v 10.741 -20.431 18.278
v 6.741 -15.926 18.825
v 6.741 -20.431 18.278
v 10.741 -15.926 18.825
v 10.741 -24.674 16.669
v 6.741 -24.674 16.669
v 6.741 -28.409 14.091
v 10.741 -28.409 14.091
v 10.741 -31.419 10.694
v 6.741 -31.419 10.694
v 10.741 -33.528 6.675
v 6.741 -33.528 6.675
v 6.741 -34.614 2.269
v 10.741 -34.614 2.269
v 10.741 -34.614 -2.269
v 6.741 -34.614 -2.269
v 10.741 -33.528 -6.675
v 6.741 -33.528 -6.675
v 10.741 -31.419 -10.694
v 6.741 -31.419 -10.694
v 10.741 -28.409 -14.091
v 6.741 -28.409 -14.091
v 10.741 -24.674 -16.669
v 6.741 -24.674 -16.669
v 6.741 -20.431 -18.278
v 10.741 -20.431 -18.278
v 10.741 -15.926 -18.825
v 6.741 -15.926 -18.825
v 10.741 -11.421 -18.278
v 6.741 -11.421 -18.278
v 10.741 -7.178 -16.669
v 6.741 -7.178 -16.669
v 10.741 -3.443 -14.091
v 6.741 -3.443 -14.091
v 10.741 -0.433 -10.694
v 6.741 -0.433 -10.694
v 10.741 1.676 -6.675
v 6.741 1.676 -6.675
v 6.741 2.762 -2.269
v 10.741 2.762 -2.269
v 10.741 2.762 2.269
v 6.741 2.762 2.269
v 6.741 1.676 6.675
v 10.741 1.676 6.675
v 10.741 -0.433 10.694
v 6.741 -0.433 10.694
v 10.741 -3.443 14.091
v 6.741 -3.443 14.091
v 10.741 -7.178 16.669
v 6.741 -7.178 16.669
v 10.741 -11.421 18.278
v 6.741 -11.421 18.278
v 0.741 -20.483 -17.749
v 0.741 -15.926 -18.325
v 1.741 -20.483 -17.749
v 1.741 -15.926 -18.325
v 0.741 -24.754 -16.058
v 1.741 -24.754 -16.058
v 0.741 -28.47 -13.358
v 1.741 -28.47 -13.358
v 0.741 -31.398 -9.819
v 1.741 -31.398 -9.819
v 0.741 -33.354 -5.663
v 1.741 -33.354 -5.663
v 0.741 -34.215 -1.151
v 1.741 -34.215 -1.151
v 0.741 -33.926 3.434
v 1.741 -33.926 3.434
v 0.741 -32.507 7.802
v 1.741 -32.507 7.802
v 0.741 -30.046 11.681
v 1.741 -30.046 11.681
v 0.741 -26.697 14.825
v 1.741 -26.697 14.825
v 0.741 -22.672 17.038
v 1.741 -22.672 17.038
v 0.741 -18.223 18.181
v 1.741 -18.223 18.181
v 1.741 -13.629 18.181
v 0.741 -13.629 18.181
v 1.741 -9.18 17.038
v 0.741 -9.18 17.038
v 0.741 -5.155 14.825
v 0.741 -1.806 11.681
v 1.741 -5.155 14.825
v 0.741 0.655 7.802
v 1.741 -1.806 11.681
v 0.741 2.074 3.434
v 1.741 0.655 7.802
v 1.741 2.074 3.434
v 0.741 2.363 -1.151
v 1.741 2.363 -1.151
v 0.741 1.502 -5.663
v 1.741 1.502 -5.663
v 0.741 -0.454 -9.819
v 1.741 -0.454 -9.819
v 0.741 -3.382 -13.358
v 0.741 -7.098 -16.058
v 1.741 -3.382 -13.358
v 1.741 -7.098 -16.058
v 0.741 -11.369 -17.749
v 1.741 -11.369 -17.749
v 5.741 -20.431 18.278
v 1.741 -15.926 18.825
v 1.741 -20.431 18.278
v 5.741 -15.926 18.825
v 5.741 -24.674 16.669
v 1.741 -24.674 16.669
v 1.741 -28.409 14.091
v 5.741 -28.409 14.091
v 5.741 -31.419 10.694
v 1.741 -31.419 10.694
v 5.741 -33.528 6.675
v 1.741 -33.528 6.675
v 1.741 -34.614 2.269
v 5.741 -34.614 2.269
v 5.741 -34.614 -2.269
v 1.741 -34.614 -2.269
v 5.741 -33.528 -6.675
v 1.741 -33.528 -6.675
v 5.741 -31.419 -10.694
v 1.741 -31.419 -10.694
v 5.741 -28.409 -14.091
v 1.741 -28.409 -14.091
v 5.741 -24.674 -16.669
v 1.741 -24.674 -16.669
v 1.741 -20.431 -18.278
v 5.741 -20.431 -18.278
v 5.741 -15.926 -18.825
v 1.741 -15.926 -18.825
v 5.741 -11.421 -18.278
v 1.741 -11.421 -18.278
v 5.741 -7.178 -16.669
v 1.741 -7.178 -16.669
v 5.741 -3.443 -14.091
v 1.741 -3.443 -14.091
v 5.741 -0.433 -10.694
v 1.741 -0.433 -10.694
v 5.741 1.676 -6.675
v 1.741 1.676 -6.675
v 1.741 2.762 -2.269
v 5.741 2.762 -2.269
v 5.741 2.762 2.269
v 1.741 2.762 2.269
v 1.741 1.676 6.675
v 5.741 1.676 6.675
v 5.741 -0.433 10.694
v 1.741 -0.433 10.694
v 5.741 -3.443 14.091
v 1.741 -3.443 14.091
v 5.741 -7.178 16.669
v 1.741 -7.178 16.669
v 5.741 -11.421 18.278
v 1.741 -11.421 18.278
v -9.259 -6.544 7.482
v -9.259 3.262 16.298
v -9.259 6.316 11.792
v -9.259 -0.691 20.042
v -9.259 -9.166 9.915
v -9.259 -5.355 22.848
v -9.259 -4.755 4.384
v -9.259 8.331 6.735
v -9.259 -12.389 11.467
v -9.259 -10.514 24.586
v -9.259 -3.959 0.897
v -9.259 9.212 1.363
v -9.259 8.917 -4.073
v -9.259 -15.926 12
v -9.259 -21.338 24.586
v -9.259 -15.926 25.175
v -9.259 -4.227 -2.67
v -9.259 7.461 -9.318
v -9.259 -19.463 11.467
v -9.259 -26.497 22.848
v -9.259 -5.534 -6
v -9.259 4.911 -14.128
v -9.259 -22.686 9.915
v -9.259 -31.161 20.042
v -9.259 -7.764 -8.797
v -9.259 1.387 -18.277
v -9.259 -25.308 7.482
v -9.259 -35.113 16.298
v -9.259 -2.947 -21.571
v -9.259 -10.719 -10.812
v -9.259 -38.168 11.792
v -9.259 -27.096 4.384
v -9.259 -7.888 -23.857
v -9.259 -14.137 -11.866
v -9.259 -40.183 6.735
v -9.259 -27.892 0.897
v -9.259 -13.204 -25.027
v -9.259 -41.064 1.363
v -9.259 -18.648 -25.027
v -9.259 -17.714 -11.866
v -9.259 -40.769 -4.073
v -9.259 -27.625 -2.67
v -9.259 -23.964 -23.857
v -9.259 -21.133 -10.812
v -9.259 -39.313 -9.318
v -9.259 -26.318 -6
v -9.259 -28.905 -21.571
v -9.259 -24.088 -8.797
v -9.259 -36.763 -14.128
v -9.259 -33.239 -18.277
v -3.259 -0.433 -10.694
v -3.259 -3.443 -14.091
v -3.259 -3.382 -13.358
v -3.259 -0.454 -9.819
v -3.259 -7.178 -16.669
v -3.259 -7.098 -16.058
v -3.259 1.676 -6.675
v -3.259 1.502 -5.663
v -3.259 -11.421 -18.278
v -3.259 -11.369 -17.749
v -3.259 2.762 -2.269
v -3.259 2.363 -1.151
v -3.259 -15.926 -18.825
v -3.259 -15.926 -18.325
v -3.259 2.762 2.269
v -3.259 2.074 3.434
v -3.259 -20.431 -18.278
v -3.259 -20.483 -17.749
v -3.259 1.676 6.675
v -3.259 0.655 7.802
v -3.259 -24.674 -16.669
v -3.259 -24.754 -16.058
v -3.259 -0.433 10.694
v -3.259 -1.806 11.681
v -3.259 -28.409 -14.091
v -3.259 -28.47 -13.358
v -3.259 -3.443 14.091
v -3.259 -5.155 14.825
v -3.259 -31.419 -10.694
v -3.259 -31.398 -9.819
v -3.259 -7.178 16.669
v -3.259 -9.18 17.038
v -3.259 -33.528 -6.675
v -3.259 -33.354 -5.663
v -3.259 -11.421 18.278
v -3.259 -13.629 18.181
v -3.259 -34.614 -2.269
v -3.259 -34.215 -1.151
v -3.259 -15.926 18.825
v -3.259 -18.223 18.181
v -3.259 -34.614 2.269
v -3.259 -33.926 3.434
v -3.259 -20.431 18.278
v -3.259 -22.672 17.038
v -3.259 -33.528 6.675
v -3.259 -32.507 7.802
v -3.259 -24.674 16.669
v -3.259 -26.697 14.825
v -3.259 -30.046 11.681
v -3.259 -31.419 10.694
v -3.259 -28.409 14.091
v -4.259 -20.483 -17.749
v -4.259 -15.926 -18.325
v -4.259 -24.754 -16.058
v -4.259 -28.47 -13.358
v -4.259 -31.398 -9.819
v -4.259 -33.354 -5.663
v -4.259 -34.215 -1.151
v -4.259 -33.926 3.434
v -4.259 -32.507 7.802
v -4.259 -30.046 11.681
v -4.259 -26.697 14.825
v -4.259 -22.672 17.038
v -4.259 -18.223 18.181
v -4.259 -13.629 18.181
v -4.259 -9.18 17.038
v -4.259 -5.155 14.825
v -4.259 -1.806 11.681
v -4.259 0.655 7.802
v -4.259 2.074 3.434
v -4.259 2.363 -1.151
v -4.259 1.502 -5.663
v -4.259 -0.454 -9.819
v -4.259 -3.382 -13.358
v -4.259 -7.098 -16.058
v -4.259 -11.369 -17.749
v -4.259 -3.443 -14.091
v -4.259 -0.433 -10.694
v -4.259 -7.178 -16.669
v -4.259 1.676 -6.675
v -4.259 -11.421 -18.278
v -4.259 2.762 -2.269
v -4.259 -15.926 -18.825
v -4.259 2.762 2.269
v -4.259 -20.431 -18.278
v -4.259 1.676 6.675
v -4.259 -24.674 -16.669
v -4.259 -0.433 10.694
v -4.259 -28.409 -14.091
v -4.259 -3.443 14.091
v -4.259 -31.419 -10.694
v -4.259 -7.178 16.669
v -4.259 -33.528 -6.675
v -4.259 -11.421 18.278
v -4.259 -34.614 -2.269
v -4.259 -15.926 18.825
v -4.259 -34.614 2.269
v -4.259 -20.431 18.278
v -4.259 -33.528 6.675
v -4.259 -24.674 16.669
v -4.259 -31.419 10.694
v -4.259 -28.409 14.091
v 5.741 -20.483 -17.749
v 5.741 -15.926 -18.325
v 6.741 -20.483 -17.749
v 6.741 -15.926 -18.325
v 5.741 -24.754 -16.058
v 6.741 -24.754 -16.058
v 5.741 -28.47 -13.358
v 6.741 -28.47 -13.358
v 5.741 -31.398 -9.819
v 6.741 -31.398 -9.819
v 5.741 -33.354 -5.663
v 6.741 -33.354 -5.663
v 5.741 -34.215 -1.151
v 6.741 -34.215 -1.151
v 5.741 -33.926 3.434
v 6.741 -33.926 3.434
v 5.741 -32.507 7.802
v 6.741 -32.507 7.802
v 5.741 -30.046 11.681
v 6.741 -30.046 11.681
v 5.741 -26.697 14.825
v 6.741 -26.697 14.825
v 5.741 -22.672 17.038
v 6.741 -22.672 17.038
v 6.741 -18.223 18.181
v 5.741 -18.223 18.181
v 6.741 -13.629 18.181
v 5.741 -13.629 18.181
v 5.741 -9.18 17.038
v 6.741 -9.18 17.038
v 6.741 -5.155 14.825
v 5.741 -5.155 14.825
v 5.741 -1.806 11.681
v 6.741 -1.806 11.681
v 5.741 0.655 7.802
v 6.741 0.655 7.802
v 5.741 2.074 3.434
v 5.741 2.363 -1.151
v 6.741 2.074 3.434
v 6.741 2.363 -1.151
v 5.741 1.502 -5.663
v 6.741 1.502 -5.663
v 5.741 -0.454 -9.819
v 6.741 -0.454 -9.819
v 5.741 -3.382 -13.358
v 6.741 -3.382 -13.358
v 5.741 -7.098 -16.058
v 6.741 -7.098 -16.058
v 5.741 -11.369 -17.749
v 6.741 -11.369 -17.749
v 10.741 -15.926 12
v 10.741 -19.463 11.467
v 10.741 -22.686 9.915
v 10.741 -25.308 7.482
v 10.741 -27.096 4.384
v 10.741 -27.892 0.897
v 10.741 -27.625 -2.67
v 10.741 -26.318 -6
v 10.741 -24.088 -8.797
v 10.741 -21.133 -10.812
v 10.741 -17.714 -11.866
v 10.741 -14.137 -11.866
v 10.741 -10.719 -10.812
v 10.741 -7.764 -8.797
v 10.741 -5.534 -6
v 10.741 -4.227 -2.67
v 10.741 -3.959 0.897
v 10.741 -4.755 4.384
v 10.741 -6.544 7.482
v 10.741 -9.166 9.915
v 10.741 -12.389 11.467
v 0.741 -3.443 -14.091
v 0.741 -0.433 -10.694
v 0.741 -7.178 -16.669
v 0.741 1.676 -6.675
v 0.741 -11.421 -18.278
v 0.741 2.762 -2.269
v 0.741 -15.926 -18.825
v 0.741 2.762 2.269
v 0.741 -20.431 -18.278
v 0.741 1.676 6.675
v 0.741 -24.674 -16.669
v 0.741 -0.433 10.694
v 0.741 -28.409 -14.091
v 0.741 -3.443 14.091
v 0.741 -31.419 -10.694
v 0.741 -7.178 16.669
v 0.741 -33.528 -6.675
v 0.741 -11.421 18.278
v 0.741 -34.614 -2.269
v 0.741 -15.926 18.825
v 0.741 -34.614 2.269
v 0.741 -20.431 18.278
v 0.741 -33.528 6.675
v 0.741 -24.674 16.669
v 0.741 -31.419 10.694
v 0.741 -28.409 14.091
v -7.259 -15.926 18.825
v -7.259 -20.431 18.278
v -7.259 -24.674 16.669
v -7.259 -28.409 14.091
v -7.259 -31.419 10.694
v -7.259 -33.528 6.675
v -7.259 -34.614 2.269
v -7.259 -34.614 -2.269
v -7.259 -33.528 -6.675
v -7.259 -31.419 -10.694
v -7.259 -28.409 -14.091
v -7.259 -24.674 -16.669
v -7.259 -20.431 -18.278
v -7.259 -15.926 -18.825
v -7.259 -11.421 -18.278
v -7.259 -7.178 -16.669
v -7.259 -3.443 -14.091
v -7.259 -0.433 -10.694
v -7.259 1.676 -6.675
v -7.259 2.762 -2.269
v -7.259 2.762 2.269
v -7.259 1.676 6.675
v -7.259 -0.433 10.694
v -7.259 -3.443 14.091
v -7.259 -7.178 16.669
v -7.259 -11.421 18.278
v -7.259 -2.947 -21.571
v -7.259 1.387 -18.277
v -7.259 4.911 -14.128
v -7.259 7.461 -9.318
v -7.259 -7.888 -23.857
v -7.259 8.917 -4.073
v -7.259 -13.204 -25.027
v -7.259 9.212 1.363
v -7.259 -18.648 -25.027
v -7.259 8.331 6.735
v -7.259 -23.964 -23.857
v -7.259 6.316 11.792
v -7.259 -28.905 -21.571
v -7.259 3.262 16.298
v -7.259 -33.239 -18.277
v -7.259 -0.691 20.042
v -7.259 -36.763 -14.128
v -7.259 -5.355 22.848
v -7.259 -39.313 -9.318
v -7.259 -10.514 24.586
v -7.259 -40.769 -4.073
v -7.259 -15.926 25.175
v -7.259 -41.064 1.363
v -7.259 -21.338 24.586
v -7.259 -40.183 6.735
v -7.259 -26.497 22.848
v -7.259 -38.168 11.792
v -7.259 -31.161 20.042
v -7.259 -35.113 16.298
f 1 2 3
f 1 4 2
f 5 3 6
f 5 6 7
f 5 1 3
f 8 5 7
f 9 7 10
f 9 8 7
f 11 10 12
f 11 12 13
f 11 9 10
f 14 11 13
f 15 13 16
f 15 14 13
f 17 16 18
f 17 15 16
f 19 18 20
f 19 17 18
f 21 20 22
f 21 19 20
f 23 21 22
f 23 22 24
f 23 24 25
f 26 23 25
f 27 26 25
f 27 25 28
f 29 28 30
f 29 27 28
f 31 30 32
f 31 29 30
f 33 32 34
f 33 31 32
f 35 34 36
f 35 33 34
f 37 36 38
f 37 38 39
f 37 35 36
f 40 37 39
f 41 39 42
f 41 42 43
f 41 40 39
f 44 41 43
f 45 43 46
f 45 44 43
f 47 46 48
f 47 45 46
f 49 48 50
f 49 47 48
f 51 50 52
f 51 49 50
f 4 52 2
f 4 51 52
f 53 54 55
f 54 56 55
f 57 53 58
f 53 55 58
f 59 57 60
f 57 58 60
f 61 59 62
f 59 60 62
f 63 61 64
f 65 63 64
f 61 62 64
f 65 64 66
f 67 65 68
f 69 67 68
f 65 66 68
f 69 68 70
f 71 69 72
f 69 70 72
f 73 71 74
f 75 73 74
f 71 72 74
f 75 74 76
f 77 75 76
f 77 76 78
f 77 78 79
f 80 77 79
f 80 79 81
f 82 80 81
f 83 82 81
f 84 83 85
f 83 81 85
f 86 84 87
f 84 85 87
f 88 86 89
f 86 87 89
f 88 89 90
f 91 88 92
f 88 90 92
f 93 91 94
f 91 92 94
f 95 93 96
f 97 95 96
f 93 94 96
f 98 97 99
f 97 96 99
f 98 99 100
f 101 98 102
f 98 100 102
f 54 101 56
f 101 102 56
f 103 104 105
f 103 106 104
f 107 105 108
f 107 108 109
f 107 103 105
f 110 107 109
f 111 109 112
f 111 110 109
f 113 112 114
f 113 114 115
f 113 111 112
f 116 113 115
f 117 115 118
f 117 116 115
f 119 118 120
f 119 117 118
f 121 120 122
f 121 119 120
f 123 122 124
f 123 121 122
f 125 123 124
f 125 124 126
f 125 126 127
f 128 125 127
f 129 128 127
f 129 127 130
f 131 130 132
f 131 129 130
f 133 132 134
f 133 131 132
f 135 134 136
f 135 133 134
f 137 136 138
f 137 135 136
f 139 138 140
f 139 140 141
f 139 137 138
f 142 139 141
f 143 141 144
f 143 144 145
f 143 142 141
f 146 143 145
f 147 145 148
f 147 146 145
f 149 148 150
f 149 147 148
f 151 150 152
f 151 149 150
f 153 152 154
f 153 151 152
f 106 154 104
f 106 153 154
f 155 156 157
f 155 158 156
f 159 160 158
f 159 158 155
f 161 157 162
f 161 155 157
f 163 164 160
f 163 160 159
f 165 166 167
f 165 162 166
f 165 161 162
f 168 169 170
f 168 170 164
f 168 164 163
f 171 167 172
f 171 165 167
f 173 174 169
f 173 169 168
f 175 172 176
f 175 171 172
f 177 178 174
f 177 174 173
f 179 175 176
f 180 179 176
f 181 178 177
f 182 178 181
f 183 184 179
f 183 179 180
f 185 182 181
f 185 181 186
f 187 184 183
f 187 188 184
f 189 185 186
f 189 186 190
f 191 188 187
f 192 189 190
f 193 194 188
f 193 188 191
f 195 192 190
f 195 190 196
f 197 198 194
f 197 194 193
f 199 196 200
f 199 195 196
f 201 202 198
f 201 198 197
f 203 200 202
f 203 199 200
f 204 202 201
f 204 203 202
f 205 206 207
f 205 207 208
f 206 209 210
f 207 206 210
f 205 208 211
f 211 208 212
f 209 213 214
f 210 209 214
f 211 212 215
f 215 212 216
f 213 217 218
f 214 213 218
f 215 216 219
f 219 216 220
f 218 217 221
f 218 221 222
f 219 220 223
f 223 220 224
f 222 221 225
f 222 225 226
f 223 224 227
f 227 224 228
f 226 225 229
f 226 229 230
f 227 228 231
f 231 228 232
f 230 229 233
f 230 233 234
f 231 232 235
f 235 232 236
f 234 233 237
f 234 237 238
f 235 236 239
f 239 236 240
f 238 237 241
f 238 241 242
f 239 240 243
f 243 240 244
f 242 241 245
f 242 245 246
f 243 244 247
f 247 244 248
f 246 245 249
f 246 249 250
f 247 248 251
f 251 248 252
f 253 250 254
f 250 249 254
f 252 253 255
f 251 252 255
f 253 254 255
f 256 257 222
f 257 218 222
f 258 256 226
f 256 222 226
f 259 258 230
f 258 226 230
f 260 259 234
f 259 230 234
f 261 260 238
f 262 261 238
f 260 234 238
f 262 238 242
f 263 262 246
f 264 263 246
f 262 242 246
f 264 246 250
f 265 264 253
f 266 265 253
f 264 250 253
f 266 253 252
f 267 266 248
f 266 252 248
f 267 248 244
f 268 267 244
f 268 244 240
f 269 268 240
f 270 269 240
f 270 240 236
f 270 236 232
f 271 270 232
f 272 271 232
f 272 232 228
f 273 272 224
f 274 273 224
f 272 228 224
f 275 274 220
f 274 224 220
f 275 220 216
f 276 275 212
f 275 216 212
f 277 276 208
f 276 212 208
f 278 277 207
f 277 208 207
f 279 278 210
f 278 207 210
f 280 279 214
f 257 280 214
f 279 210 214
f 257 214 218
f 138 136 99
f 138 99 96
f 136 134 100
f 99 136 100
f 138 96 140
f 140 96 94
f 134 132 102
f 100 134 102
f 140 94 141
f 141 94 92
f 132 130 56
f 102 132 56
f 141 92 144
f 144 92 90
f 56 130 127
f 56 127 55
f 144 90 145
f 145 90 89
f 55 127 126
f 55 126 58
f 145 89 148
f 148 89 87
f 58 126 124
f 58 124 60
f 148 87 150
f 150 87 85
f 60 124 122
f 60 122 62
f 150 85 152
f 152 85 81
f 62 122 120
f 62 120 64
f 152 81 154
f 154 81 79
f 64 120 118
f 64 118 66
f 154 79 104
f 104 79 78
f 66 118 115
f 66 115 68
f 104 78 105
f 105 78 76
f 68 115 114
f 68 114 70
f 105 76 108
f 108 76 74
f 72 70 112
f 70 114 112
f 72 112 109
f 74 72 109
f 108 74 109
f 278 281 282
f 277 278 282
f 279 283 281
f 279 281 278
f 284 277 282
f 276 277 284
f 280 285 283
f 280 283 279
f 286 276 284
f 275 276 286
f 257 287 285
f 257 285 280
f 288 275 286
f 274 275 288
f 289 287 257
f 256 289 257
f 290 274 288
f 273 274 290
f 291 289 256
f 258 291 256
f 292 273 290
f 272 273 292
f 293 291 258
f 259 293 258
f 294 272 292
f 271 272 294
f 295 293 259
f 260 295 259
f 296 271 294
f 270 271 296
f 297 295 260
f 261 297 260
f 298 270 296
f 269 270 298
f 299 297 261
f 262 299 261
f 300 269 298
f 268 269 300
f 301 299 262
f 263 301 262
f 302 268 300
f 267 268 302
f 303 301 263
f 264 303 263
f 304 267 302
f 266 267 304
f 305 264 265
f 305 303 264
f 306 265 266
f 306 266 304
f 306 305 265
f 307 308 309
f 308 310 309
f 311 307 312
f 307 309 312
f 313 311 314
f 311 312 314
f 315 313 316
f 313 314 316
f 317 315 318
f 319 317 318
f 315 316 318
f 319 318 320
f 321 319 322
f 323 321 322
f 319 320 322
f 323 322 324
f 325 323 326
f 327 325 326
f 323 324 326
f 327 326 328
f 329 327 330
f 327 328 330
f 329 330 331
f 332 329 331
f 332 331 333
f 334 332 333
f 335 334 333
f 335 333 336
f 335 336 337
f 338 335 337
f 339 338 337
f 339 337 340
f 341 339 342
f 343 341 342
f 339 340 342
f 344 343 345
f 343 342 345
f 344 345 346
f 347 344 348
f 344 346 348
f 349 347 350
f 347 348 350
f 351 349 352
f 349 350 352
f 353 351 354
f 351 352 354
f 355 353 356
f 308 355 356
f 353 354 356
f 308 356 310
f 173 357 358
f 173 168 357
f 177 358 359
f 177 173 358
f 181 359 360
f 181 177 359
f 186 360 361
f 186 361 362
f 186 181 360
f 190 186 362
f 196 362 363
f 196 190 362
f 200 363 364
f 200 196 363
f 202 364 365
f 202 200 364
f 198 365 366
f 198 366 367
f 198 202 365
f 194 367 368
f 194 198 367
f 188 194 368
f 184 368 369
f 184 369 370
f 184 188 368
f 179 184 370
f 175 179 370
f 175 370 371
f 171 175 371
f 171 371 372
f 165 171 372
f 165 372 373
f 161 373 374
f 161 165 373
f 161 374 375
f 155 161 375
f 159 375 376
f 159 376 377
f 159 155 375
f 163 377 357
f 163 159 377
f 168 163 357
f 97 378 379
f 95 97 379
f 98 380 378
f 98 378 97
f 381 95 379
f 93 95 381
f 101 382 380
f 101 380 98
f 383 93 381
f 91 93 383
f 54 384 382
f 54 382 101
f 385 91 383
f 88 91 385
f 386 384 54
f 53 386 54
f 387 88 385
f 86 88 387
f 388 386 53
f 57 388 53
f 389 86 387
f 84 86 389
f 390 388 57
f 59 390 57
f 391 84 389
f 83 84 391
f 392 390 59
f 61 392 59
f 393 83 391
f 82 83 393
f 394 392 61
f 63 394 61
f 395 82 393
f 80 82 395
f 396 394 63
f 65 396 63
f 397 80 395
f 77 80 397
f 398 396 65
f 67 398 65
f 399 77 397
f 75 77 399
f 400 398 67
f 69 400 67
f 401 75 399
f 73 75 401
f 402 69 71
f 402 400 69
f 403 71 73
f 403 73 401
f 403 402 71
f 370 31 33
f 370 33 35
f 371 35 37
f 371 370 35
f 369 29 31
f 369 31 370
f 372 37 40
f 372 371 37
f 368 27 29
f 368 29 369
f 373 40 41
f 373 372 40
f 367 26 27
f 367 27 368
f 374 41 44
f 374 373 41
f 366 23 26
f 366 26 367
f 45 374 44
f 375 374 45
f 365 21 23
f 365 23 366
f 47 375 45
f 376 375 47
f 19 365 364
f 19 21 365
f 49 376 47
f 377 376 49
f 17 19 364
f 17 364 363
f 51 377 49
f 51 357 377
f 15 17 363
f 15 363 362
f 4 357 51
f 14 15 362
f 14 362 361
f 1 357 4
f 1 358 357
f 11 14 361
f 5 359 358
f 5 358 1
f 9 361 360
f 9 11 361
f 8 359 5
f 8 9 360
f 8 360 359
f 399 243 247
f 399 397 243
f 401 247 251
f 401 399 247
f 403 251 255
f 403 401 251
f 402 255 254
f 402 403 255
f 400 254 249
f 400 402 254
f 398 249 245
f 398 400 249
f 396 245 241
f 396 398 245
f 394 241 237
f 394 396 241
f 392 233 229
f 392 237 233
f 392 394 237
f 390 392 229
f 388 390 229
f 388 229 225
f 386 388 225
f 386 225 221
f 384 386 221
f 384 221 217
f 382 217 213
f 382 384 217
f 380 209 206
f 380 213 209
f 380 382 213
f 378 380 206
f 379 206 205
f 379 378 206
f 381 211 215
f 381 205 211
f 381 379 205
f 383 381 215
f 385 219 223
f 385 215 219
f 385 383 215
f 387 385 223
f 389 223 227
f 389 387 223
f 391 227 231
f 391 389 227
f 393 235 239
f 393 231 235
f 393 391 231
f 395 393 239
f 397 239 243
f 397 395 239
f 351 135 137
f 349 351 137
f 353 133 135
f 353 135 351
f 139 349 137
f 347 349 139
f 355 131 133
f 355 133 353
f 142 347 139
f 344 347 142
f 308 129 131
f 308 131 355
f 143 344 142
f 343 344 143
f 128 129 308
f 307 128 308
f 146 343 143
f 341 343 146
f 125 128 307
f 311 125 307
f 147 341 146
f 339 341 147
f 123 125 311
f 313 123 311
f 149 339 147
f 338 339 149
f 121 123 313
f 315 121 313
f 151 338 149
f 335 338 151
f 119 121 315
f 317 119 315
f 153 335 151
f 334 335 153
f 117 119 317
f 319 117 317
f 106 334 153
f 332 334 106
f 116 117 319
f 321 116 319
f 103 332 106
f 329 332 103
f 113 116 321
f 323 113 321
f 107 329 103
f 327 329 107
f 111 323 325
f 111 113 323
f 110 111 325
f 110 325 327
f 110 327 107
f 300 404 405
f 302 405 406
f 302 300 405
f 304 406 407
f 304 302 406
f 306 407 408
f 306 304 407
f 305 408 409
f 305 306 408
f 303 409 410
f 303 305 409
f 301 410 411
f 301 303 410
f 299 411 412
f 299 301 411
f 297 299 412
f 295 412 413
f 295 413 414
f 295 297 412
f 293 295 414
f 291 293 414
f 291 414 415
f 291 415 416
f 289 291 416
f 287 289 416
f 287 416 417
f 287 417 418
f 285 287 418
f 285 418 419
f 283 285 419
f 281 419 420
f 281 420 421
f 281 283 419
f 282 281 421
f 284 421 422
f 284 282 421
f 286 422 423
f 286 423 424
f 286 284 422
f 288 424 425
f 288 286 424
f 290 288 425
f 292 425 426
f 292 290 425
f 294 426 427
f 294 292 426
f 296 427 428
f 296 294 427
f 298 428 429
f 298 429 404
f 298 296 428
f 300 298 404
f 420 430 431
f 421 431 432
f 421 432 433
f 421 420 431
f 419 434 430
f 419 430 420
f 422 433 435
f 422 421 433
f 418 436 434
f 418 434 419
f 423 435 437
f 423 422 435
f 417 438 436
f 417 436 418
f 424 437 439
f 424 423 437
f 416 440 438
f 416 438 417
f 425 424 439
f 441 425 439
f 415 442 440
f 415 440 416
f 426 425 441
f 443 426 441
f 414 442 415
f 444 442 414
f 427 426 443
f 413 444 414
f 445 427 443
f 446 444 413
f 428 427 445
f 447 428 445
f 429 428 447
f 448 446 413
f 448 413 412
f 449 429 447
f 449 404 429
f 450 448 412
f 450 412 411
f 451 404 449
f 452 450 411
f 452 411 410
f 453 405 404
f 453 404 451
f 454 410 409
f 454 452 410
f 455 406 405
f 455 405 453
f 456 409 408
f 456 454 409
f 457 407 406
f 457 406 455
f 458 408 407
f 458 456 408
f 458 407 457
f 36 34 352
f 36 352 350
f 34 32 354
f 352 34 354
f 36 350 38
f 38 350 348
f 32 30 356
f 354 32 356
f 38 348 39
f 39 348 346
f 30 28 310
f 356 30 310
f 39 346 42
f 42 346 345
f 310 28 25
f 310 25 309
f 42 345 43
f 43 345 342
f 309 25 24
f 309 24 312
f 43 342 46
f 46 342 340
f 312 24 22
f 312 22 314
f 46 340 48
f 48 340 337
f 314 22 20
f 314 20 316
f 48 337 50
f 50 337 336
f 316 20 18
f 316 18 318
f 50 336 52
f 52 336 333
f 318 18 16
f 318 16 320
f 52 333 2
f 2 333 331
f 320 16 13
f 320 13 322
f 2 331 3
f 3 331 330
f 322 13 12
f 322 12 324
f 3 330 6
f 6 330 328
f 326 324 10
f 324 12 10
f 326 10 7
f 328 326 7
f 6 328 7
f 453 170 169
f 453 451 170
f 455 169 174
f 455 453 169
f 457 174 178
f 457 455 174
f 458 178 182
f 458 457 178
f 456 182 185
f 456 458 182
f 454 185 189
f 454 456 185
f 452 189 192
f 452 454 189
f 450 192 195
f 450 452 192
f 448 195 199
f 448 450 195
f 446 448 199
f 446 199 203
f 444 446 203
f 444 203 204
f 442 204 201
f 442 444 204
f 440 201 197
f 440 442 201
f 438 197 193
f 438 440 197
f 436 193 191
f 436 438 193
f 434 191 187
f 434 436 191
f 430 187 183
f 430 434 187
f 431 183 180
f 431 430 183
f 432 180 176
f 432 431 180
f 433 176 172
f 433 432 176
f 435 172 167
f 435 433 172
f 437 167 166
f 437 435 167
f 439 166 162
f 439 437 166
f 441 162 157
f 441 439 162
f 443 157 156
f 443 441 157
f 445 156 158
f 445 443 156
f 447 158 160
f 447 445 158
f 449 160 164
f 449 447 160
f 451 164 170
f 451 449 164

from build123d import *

# Parameters (mm, degrees)
SKETCH2_W = 1
SKETCH2_H = 0.5


with BuildPart() as part:
    # Sketch1 → Revolve1 (revolve)
    with BuildSketch(Plane.XY, mode=Mode.PRIVATE) as revolve1_sk:
        Polygon((10.740740741, -3.925925926), (-9.259259259, -3.925925926), (-9.259259259, 9.249074074), (-7.259259259, 9.249074074), (-7.259259259, 2.899074074), (10.740740741, 2.899074074), align=None)
    revolve(revolve1_sk.sketch.rotate(Axis((-9.259259259, -15.925925926, 0), (1, 0, 0)), 90), axis=Axis((-9.259259259, -15.925925926, 0), (1, 0, 0)))

    # Sketch2 → Cut-Revolve1 (revolve, cut)
    with BuildSketch(Plane.XY, mode=Mode.PRIVATE) as cut_revolve1_sk:
        with Locations((6.240740741, 2.649074074)):
            Rectangle(SKETCH2_W, SKETCH2_H)
        with Locations((1.240740741, 2.649074074)):
            Rectangle(SKETCH2_W, SKETCH2_H)
        with Locations((-3.759259259, 2.649074074)):
            Rectangle(SKETCH2_W, SKETCH2_H)
    revolve(cut_revolve1_sk.sketch.rotate(Axis((10.740740741, -15.925925926, 0), (-1, 0, 0)), 90), axis=Axis((10.740740741, -15.925925926, 0), (-1, 0, 0)), mode=Mode.SUBTRACT)


solid = part.part
